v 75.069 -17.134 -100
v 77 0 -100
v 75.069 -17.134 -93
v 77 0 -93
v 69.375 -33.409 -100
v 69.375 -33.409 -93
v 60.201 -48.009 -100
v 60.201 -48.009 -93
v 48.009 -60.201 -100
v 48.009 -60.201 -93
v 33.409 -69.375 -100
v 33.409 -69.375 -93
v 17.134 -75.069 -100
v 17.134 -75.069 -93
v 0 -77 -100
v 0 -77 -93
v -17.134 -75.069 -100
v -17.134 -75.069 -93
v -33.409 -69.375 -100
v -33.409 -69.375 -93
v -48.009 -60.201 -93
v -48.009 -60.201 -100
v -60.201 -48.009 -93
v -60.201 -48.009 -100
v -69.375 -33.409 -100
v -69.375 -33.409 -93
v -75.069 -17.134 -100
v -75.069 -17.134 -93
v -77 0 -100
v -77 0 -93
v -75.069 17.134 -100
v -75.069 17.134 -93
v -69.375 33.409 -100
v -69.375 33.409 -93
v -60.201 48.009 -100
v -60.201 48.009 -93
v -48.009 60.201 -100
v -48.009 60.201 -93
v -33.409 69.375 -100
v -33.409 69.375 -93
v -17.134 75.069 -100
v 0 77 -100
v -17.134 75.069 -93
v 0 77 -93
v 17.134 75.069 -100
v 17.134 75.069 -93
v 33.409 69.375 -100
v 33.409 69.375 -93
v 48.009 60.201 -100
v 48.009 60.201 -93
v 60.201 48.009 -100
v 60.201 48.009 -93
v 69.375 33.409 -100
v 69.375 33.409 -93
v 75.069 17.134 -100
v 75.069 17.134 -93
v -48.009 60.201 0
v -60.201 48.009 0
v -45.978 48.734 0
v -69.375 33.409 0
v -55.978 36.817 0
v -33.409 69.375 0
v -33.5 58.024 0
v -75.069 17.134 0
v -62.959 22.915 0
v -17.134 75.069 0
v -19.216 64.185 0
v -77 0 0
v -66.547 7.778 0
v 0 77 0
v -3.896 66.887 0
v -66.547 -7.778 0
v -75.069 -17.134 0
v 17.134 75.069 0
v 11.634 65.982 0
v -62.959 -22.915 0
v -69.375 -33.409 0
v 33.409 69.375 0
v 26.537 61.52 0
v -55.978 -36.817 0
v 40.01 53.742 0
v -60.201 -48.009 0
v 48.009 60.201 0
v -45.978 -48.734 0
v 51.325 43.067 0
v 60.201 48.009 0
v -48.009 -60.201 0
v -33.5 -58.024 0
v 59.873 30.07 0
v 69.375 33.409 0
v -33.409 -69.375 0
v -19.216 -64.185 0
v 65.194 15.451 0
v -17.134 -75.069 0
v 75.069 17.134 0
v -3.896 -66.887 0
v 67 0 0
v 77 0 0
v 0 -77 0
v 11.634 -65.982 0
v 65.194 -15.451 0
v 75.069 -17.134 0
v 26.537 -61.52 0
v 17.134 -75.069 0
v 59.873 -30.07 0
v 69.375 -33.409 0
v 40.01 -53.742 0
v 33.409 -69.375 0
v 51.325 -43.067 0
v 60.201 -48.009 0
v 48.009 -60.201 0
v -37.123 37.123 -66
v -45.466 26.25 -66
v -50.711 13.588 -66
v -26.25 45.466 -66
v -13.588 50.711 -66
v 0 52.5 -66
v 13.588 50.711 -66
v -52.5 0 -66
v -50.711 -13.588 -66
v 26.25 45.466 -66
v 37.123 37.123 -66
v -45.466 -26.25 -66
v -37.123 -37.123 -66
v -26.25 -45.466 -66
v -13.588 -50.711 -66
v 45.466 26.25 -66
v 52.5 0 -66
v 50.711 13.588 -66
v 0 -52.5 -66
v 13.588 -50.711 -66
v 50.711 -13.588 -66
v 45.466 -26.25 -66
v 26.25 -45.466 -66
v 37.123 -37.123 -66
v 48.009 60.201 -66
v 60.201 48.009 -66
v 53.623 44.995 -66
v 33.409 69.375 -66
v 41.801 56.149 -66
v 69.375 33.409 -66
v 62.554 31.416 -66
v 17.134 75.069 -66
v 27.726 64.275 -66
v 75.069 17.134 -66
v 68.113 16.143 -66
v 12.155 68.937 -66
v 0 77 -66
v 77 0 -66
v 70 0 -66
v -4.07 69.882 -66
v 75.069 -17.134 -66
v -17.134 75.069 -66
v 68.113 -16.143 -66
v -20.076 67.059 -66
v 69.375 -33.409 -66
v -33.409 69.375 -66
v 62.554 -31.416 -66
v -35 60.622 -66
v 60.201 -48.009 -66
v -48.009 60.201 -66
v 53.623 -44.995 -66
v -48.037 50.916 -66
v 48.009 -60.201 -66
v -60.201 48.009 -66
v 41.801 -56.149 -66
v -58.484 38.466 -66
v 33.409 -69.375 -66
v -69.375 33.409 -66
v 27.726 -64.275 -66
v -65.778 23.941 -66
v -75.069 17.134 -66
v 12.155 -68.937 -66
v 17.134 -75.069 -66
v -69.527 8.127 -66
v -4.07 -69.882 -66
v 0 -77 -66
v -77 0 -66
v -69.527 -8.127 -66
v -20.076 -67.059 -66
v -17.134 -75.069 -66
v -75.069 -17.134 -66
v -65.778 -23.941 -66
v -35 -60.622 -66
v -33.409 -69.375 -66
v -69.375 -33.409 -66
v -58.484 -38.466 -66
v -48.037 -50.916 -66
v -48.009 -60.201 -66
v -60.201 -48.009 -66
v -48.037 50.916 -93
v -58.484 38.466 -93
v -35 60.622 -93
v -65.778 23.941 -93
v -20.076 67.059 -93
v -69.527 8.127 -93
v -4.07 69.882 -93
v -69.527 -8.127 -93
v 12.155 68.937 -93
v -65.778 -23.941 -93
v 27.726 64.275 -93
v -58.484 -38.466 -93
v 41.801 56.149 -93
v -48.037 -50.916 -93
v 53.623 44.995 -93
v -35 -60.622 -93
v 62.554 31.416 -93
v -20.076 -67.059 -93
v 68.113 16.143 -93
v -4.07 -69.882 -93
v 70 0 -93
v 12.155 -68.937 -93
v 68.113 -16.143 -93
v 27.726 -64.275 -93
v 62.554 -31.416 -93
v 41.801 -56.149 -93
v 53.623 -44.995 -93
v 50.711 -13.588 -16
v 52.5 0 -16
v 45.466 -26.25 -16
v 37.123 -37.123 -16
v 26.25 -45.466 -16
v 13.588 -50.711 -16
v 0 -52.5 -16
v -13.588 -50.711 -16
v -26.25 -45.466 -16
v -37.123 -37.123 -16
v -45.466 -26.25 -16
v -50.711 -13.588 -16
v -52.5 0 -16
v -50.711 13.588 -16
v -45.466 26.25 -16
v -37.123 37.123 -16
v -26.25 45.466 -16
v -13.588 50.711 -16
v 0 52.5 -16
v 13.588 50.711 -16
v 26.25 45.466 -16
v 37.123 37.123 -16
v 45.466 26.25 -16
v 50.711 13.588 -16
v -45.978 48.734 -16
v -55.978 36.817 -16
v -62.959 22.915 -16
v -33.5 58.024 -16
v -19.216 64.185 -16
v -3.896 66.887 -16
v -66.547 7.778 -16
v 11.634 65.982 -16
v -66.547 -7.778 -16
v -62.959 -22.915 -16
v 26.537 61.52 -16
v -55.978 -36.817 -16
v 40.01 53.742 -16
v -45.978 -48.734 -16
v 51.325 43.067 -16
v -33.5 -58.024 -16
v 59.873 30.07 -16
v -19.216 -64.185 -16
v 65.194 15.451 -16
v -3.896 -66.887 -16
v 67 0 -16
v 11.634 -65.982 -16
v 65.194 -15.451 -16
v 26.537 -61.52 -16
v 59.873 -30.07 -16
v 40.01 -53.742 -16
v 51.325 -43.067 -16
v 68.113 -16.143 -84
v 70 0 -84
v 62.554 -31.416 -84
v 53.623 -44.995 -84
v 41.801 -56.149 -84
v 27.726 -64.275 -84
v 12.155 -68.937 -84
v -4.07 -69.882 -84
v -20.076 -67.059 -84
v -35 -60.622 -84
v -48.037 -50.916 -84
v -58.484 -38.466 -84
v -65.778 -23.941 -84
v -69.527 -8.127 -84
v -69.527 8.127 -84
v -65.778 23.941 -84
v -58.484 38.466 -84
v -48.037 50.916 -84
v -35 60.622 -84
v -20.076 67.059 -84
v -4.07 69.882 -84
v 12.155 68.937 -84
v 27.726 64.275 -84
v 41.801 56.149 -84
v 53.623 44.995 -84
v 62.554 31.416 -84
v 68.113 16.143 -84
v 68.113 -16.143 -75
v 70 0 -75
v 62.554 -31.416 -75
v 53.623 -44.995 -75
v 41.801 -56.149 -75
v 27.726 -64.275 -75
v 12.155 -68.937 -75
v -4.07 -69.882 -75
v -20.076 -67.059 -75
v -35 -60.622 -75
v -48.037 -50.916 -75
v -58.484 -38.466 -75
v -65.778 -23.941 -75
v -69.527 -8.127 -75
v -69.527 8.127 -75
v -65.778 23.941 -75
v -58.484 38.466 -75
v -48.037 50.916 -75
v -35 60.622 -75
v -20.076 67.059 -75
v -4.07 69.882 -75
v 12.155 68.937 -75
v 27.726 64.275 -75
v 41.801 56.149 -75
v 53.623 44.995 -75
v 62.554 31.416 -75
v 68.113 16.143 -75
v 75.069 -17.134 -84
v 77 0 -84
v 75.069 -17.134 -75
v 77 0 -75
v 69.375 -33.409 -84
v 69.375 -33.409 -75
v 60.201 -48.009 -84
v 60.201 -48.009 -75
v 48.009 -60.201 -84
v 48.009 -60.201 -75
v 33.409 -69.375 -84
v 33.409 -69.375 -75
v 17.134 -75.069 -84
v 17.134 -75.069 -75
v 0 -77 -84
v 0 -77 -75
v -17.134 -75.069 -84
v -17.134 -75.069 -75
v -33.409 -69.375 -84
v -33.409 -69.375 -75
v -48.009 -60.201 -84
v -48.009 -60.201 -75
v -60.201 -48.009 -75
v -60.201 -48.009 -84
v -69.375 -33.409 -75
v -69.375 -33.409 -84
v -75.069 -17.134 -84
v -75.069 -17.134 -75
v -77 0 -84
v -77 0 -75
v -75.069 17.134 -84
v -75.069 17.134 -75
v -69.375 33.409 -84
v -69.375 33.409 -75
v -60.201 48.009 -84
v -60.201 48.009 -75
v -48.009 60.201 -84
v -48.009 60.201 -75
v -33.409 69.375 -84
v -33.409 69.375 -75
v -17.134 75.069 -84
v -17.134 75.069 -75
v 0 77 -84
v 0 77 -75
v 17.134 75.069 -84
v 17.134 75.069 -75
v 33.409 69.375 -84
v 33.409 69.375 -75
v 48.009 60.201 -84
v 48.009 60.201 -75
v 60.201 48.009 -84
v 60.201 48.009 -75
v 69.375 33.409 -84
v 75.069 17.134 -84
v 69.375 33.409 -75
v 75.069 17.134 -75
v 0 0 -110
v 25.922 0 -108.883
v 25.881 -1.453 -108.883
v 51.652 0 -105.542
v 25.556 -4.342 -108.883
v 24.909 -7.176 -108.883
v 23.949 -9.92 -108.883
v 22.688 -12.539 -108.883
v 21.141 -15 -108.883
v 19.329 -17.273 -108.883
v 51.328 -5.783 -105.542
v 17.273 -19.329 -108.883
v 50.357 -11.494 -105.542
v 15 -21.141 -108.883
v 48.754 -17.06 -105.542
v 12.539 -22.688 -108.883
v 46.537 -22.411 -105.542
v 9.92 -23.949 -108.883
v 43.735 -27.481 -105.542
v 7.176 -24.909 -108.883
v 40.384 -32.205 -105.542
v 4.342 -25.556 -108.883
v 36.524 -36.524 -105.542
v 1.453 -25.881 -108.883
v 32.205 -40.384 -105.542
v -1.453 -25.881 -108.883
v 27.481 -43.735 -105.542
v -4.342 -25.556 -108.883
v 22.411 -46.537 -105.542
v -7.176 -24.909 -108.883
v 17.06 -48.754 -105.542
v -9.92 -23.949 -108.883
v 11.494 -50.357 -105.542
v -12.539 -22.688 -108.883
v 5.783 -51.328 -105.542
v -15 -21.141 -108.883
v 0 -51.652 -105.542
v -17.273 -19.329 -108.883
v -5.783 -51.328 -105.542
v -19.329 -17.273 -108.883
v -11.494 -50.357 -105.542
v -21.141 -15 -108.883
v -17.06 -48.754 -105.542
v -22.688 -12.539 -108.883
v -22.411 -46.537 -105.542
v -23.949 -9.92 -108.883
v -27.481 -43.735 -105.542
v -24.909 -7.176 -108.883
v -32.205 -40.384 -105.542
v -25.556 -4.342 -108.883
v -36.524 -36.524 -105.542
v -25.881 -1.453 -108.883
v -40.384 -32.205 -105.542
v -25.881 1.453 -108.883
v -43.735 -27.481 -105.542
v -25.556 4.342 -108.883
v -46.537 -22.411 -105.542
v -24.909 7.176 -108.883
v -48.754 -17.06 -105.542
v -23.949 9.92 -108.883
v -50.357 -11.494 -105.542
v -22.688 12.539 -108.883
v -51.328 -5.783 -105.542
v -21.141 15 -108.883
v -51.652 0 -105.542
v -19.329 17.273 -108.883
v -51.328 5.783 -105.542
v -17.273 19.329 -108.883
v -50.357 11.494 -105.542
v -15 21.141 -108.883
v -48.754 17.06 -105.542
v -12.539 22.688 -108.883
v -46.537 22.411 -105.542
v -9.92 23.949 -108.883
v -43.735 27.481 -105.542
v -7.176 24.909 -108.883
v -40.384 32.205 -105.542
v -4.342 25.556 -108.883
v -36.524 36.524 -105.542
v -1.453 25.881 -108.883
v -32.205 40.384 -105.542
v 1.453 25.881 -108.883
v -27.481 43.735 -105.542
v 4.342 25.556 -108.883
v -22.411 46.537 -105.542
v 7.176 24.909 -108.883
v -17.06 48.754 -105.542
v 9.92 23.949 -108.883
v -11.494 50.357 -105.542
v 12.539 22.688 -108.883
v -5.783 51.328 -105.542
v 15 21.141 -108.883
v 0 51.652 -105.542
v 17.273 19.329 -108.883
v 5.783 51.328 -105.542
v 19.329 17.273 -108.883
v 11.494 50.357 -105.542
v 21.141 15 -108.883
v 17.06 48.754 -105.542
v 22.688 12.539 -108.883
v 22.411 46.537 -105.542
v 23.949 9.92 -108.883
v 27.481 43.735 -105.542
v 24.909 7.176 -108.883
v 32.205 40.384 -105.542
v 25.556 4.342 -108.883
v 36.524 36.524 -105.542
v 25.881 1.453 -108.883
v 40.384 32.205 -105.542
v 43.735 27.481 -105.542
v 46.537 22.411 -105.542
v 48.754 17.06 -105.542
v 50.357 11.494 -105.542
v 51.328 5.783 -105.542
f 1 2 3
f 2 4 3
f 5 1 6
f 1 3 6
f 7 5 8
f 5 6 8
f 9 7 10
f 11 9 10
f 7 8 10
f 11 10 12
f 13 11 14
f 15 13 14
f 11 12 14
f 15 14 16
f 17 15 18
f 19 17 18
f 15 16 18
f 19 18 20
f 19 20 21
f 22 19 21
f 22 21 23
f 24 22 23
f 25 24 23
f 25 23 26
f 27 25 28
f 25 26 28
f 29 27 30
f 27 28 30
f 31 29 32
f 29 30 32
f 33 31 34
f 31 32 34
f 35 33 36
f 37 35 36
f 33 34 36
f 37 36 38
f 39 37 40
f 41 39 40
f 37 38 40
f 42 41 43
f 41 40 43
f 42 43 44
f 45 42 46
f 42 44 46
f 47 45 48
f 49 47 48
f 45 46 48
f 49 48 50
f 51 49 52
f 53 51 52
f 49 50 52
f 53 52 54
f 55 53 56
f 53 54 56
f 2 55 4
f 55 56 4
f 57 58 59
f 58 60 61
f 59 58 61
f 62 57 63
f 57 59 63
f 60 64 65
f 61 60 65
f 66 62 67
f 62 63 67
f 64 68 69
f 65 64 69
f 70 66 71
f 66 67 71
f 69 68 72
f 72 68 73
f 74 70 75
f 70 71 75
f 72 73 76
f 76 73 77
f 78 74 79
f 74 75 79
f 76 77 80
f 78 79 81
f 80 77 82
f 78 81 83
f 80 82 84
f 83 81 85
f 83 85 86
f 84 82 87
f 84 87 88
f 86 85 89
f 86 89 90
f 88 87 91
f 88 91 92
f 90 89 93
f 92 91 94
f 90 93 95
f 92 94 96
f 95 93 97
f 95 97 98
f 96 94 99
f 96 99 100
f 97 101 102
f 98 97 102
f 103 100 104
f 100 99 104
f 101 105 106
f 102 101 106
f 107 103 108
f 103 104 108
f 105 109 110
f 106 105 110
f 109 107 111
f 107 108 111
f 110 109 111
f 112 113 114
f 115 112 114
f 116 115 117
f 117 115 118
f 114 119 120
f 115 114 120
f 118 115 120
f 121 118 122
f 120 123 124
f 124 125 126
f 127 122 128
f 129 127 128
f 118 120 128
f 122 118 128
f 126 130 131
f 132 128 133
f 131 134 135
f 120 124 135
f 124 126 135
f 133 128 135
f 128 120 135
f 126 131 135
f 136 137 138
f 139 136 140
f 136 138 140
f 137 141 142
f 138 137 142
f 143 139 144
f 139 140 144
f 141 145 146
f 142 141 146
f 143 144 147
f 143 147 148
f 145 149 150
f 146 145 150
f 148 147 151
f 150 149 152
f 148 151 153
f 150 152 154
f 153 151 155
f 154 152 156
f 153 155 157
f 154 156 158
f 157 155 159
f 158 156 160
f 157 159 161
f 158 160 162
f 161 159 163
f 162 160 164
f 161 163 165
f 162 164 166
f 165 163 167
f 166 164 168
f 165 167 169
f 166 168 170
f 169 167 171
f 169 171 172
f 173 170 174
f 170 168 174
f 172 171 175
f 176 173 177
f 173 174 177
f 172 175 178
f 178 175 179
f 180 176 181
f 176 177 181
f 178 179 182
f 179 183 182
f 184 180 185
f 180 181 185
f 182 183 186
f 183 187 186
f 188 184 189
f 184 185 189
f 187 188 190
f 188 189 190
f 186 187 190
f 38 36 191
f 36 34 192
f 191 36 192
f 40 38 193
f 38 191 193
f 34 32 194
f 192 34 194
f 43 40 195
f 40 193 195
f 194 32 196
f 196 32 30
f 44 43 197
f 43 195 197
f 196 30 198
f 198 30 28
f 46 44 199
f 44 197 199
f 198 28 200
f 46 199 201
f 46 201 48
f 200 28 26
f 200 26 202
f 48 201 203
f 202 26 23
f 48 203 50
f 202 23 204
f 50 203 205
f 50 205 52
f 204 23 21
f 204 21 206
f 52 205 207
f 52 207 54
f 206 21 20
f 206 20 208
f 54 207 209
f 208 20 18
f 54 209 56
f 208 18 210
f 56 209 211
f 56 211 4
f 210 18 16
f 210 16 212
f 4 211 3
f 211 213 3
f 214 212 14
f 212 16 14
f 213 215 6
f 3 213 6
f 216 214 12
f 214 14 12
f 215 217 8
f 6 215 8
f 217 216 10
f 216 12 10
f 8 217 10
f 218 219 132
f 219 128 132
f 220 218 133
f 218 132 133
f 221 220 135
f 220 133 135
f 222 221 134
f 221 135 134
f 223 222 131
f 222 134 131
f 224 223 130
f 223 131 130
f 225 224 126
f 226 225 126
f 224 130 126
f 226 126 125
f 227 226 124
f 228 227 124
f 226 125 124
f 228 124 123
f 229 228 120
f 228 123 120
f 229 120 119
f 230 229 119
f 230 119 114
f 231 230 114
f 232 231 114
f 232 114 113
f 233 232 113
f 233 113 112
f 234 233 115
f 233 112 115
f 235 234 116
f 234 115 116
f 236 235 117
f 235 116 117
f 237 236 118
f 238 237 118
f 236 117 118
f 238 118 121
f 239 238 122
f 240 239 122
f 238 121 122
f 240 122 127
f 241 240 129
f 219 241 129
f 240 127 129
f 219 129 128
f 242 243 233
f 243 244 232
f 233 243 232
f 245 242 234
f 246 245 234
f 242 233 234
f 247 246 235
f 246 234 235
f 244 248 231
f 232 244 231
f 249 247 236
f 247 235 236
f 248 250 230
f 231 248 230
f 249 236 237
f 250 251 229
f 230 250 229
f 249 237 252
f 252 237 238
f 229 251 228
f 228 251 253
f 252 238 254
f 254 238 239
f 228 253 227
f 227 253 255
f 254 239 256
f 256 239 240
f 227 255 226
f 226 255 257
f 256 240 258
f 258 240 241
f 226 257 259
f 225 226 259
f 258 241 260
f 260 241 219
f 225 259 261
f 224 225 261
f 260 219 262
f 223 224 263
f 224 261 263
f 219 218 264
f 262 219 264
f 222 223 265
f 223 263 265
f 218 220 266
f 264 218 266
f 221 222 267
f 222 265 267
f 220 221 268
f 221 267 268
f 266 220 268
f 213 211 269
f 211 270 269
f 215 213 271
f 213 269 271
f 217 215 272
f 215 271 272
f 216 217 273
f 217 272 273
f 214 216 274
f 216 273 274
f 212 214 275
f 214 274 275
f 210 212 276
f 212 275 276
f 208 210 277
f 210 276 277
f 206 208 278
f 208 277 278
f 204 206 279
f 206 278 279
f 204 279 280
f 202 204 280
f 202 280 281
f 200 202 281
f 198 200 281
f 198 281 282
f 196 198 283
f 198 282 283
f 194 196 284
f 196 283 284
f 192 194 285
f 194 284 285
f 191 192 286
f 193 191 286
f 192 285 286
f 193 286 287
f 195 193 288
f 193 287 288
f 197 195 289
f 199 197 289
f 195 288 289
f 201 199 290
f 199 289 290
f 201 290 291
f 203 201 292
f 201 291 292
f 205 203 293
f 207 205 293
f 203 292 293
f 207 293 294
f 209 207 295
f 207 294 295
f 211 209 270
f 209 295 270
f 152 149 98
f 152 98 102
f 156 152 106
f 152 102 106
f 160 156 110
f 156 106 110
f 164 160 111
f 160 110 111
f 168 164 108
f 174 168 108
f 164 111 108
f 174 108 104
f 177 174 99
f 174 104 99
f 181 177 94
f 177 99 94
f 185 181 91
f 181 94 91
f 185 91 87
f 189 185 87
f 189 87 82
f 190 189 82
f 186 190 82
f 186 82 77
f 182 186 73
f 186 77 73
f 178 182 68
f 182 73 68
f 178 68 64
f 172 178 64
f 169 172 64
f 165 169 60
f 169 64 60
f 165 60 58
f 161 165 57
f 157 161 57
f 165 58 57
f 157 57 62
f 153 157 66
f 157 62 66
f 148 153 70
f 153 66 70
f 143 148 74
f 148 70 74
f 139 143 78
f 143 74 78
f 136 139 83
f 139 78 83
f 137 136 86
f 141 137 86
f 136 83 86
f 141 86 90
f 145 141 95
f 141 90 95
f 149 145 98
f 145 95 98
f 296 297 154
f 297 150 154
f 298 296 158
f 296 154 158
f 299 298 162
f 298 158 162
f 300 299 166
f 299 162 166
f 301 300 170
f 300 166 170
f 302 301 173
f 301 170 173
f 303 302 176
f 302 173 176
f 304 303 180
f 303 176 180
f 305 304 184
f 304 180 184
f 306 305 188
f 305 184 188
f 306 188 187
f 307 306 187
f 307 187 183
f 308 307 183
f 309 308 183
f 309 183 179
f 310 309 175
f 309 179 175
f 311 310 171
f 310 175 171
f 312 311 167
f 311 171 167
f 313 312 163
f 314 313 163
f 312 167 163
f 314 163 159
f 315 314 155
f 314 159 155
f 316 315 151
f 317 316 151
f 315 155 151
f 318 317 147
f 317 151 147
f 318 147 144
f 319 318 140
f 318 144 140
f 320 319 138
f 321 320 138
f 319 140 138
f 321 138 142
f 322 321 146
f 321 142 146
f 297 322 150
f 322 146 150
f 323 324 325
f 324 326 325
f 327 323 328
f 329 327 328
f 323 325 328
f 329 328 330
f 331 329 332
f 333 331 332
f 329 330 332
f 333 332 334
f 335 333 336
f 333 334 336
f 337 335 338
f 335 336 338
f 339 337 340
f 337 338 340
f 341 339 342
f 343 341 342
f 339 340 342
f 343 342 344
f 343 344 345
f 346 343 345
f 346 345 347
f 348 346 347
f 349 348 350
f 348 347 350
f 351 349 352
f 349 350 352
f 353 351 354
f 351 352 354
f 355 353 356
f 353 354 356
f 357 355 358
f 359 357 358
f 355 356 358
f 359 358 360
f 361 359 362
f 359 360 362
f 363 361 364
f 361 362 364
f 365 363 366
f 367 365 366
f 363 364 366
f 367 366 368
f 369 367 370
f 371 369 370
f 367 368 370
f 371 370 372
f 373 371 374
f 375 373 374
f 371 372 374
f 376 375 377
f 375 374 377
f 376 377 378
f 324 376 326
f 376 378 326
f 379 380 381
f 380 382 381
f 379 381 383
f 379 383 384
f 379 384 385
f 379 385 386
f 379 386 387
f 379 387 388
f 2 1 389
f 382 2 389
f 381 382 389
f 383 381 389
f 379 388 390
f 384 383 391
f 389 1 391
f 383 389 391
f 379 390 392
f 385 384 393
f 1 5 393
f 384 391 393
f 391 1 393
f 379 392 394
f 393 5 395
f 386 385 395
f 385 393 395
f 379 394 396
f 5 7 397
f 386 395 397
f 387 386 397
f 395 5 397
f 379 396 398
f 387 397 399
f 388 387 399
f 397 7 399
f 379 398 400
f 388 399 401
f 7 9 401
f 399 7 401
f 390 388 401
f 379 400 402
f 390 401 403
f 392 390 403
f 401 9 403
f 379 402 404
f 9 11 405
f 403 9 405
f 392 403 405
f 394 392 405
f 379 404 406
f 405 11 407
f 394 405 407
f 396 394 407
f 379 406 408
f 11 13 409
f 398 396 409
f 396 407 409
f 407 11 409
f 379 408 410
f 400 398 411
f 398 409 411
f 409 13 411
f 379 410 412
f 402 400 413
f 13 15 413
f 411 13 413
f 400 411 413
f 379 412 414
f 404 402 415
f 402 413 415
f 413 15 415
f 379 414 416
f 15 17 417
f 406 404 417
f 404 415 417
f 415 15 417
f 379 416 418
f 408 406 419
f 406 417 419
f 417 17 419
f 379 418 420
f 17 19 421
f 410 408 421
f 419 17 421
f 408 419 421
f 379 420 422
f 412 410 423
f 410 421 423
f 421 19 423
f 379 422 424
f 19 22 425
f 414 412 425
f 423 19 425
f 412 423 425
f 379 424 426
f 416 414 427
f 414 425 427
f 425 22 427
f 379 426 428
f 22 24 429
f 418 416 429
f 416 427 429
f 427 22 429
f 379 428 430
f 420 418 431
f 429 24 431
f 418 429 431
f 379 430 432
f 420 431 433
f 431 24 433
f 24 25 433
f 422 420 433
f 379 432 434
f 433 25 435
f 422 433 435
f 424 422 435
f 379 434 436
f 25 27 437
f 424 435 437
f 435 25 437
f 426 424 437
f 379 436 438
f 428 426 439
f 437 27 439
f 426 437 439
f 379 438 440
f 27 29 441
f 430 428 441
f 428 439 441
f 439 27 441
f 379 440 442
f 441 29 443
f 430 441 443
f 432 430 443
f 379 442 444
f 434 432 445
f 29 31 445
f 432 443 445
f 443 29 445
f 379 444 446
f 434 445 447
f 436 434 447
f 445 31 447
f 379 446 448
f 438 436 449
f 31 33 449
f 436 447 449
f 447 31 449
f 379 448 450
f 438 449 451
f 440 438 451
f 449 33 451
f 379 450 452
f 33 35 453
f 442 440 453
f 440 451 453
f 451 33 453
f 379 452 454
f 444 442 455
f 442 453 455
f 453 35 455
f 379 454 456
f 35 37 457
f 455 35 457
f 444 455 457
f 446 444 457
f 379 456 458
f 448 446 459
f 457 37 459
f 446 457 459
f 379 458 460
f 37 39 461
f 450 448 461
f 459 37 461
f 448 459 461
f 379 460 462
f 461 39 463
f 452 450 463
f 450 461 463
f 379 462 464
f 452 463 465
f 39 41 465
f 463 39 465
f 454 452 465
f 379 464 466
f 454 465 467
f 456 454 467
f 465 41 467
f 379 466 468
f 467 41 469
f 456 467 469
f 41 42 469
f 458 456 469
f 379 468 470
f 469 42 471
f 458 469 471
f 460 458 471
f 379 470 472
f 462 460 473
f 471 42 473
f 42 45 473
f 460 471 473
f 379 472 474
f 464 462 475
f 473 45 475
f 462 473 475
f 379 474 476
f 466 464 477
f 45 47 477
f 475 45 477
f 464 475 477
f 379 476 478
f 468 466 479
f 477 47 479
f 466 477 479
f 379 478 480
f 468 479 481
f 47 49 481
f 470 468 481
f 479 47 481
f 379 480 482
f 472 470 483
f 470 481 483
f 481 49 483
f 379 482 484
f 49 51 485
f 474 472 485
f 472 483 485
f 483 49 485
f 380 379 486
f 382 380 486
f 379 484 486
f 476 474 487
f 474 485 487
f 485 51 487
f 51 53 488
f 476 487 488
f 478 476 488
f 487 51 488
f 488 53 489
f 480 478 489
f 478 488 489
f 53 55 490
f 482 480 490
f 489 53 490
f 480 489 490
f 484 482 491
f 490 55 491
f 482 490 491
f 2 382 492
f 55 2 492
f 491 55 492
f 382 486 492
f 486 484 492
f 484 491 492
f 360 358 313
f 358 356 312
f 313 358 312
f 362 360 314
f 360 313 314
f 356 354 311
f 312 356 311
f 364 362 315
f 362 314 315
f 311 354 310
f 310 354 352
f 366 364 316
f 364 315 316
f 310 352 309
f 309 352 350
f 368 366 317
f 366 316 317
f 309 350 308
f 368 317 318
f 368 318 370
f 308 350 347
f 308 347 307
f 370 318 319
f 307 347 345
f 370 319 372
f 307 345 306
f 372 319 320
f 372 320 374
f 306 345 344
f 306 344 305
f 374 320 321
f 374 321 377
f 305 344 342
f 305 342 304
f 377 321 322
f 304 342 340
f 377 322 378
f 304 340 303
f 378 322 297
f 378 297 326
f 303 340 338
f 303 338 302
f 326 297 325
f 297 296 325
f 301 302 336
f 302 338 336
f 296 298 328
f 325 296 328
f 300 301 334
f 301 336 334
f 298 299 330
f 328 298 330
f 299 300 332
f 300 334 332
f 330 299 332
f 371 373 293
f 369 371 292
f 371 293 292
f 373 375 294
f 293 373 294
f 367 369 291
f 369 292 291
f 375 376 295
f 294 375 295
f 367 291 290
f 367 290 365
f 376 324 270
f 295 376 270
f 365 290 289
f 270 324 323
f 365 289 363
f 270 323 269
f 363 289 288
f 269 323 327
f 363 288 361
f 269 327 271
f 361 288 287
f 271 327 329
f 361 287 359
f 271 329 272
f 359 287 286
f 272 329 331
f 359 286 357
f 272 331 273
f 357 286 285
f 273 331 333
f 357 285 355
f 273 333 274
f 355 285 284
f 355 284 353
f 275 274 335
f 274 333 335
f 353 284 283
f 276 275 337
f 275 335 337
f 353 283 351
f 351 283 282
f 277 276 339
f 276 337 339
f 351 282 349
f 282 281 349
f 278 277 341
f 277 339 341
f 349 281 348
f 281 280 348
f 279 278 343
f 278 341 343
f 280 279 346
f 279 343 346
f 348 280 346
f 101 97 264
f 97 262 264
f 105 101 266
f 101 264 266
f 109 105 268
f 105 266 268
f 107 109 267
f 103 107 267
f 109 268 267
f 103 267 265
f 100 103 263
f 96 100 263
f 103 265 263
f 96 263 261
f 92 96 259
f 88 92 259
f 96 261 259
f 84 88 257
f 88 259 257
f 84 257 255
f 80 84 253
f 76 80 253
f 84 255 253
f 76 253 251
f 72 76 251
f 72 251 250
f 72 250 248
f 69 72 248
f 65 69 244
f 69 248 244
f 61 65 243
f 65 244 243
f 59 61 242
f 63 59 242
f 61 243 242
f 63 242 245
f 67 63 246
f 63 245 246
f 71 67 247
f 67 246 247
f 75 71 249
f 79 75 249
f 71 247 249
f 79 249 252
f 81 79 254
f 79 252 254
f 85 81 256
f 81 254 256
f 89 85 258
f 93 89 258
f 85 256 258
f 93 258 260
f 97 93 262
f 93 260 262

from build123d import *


with BuildPart() as part:
    # Sketch1 → Revolve7 (revolve)
    with BuildSketch(Plane(origin=(0, 0, 0), x_dir=(1, 0, 0), z_dir=(0, 1, 0))):
        with BuildLine():
            Line((0, 66), (0, 110))
            ThreePointArc((0, 110), (38.823317736, 107.489546564), (77, 100))
            Line((77, 100), (77, 93))
            Line((77, 93), (70, 93))
            Line((70, 93), (70, 84))
            Line((70, 84), (77, 84))
            Line((77, 84), (77, 75))
            Line((77, 75), (70, 75))
            Line((70, 75), (70, 66))
            Line((70, 66), (77, 66))
            Line((77, 66), (77, 0))
            Line((77, 0), (67, 0))
            Line((67, 0), (67, 16))
            Line((67, 16), (52.5, 16))
            Line((52.5, 16), (52.5, 66))
            Line((52.5, 66), (0, 66))
        make_face()
    revolve(axis=Axis((0, 0, 14.193325573), (0, 0, -1)))


solid = part.part
